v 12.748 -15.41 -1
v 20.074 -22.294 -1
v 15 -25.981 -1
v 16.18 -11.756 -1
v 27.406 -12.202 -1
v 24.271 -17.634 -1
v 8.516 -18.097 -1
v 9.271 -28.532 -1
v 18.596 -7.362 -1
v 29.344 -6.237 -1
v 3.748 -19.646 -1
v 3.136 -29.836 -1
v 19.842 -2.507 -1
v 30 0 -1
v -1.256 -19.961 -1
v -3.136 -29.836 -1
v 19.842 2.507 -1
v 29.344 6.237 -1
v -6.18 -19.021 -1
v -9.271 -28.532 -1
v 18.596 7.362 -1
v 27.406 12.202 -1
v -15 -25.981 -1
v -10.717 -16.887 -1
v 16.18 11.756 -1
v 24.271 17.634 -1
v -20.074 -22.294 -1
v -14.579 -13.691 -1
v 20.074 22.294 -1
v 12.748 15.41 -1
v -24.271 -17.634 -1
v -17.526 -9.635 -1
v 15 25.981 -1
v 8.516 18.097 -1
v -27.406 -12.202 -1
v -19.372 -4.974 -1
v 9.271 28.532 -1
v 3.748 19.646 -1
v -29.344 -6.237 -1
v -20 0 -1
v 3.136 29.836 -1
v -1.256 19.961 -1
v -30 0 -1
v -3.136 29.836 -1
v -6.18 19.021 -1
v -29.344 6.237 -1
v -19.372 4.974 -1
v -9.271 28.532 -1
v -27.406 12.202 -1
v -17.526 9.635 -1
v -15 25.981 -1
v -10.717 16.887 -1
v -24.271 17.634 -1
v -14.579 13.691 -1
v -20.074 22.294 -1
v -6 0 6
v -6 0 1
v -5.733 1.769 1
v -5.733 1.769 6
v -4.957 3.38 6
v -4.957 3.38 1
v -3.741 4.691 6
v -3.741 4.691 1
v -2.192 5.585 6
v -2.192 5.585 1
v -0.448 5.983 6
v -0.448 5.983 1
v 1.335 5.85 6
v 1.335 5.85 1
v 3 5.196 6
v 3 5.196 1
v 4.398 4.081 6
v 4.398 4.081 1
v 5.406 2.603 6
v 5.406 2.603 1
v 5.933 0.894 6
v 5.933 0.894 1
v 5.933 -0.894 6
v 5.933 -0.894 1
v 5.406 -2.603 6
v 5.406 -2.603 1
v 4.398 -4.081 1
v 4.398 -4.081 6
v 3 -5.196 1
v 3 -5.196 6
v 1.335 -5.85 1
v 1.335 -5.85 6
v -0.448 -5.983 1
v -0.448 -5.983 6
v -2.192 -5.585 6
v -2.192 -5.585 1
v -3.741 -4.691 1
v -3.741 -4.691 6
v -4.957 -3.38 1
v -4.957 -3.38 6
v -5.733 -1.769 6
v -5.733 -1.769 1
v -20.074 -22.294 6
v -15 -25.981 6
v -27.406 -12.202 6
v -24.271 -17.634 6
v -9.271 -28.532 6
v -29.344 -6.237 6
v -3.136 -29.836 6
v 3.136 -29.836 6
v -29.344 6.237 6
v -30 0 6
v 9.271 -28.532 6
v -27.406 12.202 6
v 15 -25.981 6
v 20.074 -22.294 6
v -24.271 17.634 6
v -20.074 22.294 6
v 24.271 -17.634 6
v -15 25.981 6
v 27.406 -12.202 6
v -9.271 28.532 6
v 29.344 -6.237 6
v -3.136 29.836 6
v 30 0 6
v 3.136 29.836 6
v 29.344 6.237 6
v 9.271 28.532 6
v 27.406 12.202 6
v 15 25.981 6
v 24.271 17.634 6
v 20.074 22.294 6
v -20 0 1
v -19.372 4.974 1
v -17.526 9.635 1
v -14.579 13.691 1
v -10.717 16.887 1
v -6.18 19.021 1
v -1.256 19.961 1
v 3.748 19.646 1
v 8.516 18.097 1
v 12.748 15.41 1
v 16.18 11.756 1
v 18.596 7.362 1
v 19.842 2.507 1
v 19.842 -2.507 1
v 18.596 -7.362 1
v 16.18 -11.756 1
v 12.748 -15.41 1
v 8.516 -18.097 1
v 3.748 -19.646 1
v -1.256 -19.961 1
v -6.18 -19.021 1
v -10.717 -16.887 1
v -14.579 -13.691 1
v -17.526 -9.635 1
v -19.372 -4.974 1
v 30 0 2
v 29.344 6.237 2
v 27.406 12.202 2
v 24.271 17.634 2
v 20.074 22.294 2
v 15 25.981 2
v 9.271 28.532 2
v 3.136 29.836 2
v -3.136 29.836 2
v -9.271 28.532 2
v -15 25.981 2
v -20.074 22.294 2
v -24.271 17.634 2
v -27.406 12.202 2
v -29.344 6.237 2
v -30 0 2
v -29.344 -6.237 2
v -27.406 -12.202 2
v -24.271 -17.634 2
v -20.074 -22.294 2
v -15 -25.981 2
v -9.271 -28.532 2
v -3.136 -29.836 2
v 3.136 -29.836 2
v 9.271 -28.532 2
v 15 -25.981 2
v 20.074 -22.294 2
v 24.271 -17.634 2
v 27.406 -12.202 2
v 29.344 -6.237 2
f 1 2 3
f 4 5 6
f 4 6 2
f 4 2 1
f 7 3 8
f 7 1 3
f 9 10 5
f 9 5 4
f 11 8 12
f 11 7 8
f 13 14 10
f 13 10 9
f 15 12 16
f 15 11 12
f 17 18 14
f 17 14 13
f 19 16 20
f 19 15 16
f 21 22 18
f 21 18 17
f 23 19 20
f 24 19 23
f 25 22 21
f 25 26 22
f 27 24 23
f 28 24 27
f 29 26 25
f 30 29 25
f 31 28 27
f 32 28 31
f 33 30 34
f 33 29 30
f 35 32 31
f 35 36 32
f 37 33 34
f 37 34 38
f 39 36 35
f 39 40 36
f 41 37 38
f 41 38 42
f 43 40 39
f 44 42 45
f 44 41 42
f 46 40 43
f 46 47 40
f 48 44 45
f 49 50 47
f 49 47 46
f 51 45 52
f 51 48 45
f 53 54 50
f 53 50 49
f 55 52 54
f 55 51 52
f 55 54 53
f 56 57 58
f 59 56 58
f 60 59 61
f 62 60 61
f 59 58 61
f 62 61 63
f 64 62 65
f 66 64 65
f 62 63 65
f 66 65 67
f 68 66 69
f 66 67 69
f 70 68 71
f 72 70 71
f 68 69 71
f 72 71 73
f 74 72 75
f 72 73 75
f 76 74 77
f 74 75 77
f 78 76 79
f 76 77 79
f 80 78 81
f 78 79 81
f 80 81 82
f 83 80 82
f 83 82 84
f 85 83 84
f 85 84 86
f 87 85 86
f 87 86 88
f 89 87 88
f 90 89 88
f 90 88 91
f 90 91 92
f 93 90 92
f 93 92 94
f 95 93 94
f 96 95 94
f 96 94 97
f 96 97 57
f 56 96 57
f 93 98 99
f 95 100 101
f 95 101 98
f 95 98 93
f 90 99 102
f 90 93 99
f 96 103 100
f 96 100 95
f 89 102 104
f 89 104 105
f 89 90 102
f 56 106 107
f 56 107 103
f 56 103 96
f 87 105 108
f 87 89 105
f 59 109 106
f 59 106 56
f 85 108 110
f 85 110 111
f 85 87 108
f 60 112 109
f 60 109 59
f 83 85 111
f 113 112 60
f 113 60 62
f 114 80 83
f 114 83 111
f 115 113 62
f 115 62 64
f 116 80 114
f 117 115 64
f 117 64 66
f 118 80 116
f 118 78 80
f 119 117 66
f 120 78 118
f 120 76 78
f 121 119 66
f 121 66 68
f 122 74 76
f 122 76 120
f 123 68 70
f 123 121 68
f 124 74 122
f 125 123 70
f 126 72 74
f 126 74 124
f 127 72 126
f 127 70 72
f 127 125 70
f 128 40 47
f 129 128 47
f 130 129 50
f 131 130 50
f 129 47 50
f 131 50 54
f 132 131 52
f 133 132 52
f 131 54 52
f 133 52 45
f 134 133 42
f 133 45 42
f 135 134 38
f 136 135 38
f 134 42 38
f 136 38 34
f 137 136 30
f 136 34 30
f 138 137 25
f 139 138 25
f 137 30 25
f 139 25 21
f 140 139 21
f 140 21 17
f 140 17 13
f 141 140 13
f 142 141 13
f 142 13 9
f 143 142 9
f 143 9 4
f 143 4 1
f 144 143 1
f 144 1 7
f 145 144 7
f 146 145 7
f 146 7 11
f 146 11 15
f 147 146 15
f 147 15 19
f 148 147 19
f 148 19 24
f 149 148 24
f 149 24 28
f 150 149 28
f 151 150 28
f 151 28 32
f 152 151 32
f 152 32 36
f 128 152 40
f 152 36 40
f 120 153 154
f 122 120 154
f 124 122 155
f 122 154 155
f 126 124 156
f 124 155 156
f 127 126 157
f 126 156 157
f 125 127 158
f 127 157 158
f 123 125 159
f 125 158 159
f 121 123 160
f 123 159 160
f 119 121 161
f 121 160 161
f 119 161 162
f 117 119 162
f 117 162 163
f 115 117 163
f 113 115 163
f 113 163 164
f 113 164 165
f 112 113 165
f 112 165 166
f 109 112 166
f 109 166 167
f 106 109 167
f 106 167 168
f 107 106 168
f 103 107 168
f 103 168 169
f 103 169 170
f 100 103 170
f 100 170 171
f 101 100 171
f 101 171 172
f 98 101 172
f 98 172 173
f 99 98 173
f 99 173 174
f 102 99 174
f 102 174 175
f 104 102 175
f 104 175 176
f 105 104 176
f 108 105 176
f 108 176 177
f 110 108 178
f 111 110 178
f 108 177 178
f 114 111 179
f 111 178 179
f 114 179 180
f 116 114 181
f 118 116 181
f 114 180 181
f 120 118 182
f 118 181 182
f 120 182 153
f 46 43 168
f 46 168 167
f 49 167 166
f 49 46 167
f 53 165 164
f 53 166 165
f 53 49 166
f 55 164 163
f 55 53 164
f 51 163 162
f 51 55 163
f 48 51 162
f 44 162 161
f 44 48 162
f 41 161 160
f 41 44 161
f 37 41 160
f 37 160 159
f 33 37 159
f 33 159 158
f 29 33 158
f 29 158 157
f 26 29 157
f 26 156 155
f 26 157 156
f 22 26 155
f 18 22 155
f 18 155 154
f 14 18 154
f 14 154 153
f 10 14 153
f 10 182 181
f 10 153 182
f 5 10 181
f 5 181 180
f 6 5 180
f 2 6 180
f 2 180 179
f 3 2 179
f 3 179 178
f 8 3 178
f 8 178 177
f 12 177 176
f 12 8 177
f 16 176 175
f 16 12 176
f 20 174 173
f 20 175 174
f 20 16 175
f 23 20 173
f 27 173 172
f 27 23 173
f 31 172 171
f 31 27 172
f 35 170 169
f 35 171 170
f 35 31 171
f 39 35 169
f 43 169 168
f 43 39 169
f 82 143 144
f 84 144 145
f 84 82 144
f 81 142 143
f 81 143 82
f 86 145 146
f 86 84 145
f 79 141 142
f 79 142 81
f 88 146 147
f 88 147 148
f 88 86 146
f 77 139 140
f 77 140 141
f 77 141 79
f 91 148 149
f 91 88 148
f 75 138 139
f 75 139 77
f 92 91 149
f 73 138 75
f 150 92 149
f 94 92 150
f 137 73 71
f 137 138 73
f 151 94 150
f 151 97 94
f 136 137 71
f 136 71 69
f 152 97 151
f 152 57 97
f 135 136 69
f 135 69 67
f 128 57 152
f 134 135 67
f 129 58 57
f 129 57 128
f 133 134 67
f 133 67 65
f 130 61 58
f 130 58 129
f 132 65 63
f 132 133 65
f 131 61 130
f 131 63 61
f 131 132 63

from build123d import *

# Parameters (mm, degrees)
SKETCH2_R           = 30
BOSS_EXTRUDE1_DEPTH = 6
SKETCH3_R           = 8
CUT_EXTRUDE1_DEPTH  = 2
SKETCH4_R           = 6
CUT_EXTRUDE2_DEPTH  = 5
SKETCH5_R           = 30
SKETCH5_R_2         = 8
CUT_EXTRUDE3_DEPTH  = 2
BOSS_EXTRUDE3_START = 3
SKETCH7_R           = 30
SKETCH7_R_2         = 20
BOSS_EXTRUDE3_DEPTH = 3
BOSS_EXTRUDE4_START = 1
SKETCH8_R           = 20
SKETCH8_R_2         = 6
BOSS_EXTRUDE4_DEPTH = 1


with BuildPart() as part:
    # Sketch2 → Boss-Extrude1 (new body)
    with BuildSketch(Plane.XY):
        Circle(SKETCH2_R)
    extrude(amount=BOSS_EXTRUDE1_DEPTH)

    # Sketch3 → Cut-Extrude1 (cut)
    with BuildSketch(Plane(origin=(0, 0, 0), x_dir=(-1, 0, 0), z_dir=(0, 0, -1))):
        Circle(SKETCH3_R)
    extrude(amount=-CUT_EXTRUDE1_DEPTH, mode=Mode.SUBTRACT)

    # Sketch4 → Cut-Extrude2 (cut)
    with BuildSketch(Plane(origin=(0, 0, 2), x_dir=(-1, 0, 0), z_dir=(0, 0, -1))):
        Circle(SKETCH4_R)
    extrude(amount=-CUT_EXTRUDE2_DEPTH, mode=Mode.SUBTRACT)

    # Sketch5 → Cut-Extrude3 (cut)
    with BuildSketch(Plane(origin=(0, 0, 0), x_dir=(-1, 0, 0), z_dir=(0, 0, -1))):
        Circle(SKETCH5_R)
        Circle(SKETCH5_R_2, mode=Mode.SUBTRACT)
    extrude(amount=-CUT_EXTRUDE3_DEPTH, mode=Mode.SUBTRACT)

    # Sketch7 → Boss-Extrude3 (add)
    with BuildSketch(Plane(origin=(0, 0, 2), x_dir=(-1, 0, 0), z_dir=(0, 0, -1)).offset(BOSS_EXTRUDE3_START)):
        Circle(SKETCH7_R)
        Circle(SKETCH7_R_2, mode=Mode.SUBTRACT)
    extrude(amount=-BOSS_EXTRUDE3_DEPTH)

    # Sketch8 → Boss-Extrude4 (add)
    with BuildSketch(Plane(origin=(0, 0, 2), x_dir=(-1, 0, 0), z_dir=(0, 0, -1)).offset(BOSS_EXTRUDE4_START)):
        Circle(SKETCH8_R)
        Circle(SKETCH8_R_2, mode=Mode.SUBTRACT)
    extrude(amount=-BOSS_EXTRUDE4_DEPTH)


solid = part.part
